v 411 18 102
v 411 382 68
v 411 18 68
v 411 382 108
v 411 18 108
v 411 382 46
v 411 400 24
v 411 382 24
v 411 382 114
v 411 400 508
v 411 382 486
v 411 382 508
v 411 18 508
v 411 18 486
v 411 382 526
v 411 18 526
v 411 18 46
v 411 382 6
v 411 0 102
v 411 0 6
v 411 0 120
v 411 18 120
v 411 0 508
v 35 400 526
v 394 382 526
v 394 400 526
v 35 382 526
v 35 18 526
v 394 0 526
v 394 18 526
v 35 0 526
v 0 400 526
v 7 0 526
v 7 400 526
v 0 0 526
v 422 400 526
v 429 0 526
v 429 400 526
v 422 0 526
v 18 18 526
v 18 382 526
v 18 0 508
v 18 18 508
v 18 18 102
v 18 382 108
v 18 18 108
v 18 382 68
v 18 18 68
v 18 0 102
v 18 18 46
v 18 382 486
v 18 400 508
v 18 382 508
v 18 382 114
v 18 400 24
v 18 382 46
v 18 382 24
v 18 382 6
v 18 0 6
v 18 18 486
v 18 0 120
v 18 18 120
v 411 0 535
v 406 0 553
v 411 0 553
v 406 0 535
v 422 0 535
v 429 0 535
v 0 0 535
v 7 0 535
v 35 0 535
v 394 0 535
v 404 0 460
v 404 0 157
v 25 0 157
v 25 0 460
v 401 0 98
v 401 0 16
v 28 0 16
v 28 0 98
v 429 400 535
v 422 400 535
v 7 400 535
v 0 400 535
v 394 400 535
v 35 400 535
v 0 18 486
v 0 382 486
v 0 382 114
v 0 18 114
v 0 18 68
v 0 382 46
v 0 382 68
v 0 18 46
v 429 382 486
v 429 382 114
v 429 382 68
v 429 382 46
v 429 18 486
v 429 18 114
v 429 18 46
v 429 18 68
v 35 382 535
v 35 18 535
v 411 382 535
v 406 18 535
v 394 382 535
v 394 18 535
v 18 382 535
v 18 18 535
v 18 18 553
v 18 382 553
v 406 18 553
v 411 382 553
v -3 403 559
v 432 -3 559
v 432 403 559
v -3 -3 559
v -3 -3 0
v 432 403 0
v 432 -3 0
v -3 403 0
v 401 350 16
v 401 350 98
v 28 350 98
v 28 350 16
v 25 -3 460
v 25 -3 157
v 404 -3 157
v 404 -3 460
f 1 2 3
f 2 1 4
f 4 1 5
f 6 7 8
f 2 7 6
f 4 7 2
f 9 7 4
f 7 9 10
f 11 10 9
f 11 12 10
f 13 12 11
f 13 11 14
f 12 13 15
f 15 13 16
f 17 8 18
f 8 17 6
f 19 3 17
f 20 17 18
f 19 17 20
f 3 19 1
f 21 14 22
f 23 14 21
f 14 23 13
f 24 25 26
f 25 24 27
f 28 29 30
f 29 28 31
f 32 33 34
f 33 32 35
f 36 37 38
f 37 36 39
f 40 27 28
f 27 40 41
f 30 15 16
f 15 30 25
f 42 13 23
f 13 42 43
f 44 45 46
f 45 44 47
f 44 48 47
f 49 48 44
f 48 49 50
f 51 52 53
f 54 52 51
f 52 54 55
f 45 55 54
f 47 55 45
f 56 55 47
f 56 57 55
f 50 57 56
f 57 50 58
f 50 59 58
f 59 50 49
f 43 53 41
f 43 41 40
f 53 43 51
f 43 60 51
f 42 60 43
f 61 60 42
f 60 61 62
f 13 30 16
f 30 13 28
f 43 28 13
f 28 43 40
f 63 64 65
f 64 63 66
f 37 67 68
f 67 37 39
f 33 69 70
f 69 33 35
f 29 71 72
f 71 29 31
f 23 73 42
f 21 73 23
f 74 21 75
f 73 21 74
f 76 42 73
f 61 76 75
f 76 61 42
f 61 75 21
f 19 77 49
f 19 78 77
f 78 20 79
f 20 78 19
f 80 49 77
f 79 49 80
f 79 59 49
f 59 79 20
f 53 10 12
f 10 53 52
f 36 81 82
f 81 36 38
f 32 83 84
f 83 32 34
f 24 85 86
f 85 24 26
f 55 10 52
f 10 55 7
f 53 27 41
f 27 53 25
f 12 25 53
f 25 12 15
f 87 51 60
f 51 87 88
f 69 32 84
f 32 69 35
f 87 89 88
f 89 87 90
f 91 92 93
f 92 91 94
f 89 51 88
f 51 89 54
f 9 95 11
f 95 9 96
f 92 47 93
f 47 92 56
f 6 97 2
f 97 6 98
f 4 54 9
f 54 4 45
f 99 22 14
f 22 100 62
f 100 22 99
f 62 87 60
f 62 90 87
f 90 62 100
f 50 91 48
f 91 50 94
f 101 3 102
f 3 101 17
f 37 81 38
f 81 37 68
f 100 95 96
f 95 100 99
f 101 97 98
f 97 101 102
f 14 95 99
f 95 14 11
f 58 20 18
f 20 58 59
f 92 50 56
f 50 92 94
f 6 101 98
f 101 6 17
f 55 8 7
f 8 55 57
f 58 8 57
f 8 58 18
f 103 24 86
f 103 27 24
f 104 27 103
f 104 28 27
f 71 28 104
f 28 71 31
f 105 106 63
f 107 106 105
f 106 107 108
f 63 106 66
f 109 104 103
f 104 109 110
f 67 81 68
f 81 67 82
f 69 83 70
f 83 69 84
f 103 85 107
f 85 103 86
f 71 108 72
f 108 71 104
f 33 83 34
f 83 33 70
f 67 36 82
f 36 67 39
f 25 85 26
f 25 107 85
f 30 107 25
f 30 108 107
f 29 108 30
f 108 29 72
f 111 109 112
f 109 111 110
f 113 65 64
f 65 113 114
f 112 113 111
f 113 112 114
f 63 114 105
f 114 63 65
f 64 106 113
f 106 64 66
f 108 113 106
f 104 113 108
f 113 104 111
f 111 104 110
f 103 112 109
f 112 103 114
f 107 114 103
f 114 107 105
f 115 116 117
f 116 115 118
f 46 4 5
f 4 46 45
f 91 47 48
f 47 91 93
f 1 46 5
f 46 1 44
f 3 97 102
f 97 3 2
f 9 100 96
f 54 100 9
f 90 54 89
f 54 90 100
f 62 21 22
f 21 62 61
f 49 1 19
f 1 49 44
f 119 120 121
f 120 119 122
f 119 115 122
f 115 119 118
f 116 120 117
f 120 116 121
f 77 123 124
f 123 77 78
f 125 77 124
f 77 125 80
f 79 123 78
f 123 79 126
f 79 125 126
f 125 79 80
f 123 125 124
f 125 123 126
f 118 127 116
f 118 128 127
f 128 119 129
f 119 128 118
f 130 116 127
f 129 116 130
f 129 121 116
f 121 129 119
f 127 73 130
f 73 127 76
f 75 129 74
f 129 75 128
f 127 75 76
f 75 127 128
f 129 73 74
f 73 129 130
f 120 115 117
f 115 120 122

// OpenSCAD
//ecran 15" 4/3 = 229mm x 305mm
//plus cadre ~~ 260x335

//ecran 15" 16/9 = 187mm x 332mm
//plus cadre ~~ 210x360
//ok

l_e=379; // largeur ext écran mm
jeu= 7;//jeu de chaque coté mm

pp= 400; // profondeur caisse mm

t1=18; // largeur tasseau 1 (carre)
t2=13;

p1l=28; //l planche1
p1h=9;//h planche1

p2l=40; //l planche1
p2h=18;//h planche1


ll=l_e+2*jeu+2*t1; //largeur ext structure
echo("ll",ll);


ee=6; //epaisseur plateau milieu

jj=400;
kk=120; // hteur dessous
hh=jj+kk; // hteur
hh2=hh+p1h+t1+ee+ee; //

ii=3; //e. placage

color("grey")
cube([ll,pp,ee]);

translate([0,0,hh-t1+ee]){
color("blue") {
    translate([t1,0,0])
    cube([ll-2*t1,t1,t1]);
    translate([t1,pp-t1,0])
    cube([ll-2*t1,t1,t1]);
    }
color("magenta") {
    translate([0,t1,t1-p2l])
    cube([p2h,pp-2*t1,p2l]);
    translate([ll-t1,t1,t1-p2l])
    cube([p2h,pp-2*t1,p2l]);
    }
}
translate([0,0,ee]){
color("green") {
    translate([0,0,0])
    cube([t1,t1,hh]);
    translate([ll-t1,0,0])
    cube([t1,t1,hh]);
    translate([0,pp-t1,0])
    cube([t1,t1,hh]);
    translate([ll-t1,pp-t1,0])
    cube([t1,t1,hh]);
    }
color("magenta") {
    translate([0,t1,0])
    cube([p2h,pp-2*t1,p2l]);
    translate([ll-t1,t1,0])
    cube([p2h,pp-2*t1,p2l]);
    }
color("blue") {
    translate([t1,pp-t1,0])
    cube([ll-2*t1,t1,t1]);
    }
}
// planches sur le cadre
translate([0,0,hh+ee]){
color("orange"){
    translate([jeu,0,0])
    cube([p1l,pp,p1h]);
    translate([ll-p1l-jeu,0,0])
    cube([p1l,pp,p1h]);
    }
}
// couvercle

color("yellow") {
    translate([0,0,hh+ee+p1h]){
        translate([0,0,0])
        cube([t1,pp,t1]);
        translate([ll-t1,0,0])
        cube([t1,pp,t1]);
        translate([t2,0,0])
        cube([ll-2*t1,t1,t1]);
        translate([t1,pp-t1,0])
        cube([ll-2*t1,t1,t1]);
        translate([0,0,t1])
        cube([ll,pp,ee]);
    }
}

//middle
translate([0,0,kk-p2l-ee-ee]){
    color("magenta") {
    translate([0,t1,0])
    cube([p2h,pp-2*t1,p2l]);
    translate([ll-t1,t1,0])
    cube([p2h,pp-2*t1,p2l]);
    }
    color("grey",0.7){
    union(){
//    translate([t1,0,p2l])
//    cube([ll-2*t1,pp,ee]);
    translate([0,t1,p2l])
    cube([ll,pp-2*t1,ee]);
    }
    }
    color("blue",0.5) {
    translate([t1,0,p2l+ee/2-t1/2])
    cube([ll-2*t1,t1,t1]);
    }
}

// placage
color("tan",0.8){
    translate([-ii,0,0])
    cube([ii,pp,hh2]);
    translate([ll,0,0])
    cube([ii,pp,hh2]);
}
//arriere
translate([-ii,pp,0])
color("pink")
cube([ll+2*ii,ii,hh2]);

//tiroir
{
e_coulisse=10;
p_coulisse=350;
h_coulisse=10;
h_ss_plancher=10;
color("red",0.8){
    translate([t1+e_coulisse,0,ee+h_coulisse])
    cube([ll-2*t1-2*e_coulisse,p_coulisse,kk-3*ee-h_coulisse-h_ss_plancher]);
    translate([-ii,-ii,0])
    cube([ll+2*ii,ii,kk-2*ee-h_ss_plancher]);
}
}

//devant
color("pink")
union(){
    h_cache=60;
    translate([-ii,-ii,hh-h_cache])
    cube([ll+2*ii,ii,h_cache-hh+hh2]);
    //devant bas
    h_cache_b=20;
    translate([-ii,-ii,kk-2*ee-h_ss_plancher])
    cube([ll+2*ii,ii,h_cache_b-hh+hh2]);
    //
    cote=25;
    translate([-ii,-ii,kk-2*ee-h_ss_plancher+h_cache_b-hh+hh2])
    cube([cote+ii,ii,jj-h_cache+hh-hh2+ii]);
    translate([ll-cote,-ii,kk-2*ee-h_ss_plancher+h_cache_b-hh+hh2])
    cube([cote+ii,ii,jj-h_cache+hh-hh2+ii]);
    }
